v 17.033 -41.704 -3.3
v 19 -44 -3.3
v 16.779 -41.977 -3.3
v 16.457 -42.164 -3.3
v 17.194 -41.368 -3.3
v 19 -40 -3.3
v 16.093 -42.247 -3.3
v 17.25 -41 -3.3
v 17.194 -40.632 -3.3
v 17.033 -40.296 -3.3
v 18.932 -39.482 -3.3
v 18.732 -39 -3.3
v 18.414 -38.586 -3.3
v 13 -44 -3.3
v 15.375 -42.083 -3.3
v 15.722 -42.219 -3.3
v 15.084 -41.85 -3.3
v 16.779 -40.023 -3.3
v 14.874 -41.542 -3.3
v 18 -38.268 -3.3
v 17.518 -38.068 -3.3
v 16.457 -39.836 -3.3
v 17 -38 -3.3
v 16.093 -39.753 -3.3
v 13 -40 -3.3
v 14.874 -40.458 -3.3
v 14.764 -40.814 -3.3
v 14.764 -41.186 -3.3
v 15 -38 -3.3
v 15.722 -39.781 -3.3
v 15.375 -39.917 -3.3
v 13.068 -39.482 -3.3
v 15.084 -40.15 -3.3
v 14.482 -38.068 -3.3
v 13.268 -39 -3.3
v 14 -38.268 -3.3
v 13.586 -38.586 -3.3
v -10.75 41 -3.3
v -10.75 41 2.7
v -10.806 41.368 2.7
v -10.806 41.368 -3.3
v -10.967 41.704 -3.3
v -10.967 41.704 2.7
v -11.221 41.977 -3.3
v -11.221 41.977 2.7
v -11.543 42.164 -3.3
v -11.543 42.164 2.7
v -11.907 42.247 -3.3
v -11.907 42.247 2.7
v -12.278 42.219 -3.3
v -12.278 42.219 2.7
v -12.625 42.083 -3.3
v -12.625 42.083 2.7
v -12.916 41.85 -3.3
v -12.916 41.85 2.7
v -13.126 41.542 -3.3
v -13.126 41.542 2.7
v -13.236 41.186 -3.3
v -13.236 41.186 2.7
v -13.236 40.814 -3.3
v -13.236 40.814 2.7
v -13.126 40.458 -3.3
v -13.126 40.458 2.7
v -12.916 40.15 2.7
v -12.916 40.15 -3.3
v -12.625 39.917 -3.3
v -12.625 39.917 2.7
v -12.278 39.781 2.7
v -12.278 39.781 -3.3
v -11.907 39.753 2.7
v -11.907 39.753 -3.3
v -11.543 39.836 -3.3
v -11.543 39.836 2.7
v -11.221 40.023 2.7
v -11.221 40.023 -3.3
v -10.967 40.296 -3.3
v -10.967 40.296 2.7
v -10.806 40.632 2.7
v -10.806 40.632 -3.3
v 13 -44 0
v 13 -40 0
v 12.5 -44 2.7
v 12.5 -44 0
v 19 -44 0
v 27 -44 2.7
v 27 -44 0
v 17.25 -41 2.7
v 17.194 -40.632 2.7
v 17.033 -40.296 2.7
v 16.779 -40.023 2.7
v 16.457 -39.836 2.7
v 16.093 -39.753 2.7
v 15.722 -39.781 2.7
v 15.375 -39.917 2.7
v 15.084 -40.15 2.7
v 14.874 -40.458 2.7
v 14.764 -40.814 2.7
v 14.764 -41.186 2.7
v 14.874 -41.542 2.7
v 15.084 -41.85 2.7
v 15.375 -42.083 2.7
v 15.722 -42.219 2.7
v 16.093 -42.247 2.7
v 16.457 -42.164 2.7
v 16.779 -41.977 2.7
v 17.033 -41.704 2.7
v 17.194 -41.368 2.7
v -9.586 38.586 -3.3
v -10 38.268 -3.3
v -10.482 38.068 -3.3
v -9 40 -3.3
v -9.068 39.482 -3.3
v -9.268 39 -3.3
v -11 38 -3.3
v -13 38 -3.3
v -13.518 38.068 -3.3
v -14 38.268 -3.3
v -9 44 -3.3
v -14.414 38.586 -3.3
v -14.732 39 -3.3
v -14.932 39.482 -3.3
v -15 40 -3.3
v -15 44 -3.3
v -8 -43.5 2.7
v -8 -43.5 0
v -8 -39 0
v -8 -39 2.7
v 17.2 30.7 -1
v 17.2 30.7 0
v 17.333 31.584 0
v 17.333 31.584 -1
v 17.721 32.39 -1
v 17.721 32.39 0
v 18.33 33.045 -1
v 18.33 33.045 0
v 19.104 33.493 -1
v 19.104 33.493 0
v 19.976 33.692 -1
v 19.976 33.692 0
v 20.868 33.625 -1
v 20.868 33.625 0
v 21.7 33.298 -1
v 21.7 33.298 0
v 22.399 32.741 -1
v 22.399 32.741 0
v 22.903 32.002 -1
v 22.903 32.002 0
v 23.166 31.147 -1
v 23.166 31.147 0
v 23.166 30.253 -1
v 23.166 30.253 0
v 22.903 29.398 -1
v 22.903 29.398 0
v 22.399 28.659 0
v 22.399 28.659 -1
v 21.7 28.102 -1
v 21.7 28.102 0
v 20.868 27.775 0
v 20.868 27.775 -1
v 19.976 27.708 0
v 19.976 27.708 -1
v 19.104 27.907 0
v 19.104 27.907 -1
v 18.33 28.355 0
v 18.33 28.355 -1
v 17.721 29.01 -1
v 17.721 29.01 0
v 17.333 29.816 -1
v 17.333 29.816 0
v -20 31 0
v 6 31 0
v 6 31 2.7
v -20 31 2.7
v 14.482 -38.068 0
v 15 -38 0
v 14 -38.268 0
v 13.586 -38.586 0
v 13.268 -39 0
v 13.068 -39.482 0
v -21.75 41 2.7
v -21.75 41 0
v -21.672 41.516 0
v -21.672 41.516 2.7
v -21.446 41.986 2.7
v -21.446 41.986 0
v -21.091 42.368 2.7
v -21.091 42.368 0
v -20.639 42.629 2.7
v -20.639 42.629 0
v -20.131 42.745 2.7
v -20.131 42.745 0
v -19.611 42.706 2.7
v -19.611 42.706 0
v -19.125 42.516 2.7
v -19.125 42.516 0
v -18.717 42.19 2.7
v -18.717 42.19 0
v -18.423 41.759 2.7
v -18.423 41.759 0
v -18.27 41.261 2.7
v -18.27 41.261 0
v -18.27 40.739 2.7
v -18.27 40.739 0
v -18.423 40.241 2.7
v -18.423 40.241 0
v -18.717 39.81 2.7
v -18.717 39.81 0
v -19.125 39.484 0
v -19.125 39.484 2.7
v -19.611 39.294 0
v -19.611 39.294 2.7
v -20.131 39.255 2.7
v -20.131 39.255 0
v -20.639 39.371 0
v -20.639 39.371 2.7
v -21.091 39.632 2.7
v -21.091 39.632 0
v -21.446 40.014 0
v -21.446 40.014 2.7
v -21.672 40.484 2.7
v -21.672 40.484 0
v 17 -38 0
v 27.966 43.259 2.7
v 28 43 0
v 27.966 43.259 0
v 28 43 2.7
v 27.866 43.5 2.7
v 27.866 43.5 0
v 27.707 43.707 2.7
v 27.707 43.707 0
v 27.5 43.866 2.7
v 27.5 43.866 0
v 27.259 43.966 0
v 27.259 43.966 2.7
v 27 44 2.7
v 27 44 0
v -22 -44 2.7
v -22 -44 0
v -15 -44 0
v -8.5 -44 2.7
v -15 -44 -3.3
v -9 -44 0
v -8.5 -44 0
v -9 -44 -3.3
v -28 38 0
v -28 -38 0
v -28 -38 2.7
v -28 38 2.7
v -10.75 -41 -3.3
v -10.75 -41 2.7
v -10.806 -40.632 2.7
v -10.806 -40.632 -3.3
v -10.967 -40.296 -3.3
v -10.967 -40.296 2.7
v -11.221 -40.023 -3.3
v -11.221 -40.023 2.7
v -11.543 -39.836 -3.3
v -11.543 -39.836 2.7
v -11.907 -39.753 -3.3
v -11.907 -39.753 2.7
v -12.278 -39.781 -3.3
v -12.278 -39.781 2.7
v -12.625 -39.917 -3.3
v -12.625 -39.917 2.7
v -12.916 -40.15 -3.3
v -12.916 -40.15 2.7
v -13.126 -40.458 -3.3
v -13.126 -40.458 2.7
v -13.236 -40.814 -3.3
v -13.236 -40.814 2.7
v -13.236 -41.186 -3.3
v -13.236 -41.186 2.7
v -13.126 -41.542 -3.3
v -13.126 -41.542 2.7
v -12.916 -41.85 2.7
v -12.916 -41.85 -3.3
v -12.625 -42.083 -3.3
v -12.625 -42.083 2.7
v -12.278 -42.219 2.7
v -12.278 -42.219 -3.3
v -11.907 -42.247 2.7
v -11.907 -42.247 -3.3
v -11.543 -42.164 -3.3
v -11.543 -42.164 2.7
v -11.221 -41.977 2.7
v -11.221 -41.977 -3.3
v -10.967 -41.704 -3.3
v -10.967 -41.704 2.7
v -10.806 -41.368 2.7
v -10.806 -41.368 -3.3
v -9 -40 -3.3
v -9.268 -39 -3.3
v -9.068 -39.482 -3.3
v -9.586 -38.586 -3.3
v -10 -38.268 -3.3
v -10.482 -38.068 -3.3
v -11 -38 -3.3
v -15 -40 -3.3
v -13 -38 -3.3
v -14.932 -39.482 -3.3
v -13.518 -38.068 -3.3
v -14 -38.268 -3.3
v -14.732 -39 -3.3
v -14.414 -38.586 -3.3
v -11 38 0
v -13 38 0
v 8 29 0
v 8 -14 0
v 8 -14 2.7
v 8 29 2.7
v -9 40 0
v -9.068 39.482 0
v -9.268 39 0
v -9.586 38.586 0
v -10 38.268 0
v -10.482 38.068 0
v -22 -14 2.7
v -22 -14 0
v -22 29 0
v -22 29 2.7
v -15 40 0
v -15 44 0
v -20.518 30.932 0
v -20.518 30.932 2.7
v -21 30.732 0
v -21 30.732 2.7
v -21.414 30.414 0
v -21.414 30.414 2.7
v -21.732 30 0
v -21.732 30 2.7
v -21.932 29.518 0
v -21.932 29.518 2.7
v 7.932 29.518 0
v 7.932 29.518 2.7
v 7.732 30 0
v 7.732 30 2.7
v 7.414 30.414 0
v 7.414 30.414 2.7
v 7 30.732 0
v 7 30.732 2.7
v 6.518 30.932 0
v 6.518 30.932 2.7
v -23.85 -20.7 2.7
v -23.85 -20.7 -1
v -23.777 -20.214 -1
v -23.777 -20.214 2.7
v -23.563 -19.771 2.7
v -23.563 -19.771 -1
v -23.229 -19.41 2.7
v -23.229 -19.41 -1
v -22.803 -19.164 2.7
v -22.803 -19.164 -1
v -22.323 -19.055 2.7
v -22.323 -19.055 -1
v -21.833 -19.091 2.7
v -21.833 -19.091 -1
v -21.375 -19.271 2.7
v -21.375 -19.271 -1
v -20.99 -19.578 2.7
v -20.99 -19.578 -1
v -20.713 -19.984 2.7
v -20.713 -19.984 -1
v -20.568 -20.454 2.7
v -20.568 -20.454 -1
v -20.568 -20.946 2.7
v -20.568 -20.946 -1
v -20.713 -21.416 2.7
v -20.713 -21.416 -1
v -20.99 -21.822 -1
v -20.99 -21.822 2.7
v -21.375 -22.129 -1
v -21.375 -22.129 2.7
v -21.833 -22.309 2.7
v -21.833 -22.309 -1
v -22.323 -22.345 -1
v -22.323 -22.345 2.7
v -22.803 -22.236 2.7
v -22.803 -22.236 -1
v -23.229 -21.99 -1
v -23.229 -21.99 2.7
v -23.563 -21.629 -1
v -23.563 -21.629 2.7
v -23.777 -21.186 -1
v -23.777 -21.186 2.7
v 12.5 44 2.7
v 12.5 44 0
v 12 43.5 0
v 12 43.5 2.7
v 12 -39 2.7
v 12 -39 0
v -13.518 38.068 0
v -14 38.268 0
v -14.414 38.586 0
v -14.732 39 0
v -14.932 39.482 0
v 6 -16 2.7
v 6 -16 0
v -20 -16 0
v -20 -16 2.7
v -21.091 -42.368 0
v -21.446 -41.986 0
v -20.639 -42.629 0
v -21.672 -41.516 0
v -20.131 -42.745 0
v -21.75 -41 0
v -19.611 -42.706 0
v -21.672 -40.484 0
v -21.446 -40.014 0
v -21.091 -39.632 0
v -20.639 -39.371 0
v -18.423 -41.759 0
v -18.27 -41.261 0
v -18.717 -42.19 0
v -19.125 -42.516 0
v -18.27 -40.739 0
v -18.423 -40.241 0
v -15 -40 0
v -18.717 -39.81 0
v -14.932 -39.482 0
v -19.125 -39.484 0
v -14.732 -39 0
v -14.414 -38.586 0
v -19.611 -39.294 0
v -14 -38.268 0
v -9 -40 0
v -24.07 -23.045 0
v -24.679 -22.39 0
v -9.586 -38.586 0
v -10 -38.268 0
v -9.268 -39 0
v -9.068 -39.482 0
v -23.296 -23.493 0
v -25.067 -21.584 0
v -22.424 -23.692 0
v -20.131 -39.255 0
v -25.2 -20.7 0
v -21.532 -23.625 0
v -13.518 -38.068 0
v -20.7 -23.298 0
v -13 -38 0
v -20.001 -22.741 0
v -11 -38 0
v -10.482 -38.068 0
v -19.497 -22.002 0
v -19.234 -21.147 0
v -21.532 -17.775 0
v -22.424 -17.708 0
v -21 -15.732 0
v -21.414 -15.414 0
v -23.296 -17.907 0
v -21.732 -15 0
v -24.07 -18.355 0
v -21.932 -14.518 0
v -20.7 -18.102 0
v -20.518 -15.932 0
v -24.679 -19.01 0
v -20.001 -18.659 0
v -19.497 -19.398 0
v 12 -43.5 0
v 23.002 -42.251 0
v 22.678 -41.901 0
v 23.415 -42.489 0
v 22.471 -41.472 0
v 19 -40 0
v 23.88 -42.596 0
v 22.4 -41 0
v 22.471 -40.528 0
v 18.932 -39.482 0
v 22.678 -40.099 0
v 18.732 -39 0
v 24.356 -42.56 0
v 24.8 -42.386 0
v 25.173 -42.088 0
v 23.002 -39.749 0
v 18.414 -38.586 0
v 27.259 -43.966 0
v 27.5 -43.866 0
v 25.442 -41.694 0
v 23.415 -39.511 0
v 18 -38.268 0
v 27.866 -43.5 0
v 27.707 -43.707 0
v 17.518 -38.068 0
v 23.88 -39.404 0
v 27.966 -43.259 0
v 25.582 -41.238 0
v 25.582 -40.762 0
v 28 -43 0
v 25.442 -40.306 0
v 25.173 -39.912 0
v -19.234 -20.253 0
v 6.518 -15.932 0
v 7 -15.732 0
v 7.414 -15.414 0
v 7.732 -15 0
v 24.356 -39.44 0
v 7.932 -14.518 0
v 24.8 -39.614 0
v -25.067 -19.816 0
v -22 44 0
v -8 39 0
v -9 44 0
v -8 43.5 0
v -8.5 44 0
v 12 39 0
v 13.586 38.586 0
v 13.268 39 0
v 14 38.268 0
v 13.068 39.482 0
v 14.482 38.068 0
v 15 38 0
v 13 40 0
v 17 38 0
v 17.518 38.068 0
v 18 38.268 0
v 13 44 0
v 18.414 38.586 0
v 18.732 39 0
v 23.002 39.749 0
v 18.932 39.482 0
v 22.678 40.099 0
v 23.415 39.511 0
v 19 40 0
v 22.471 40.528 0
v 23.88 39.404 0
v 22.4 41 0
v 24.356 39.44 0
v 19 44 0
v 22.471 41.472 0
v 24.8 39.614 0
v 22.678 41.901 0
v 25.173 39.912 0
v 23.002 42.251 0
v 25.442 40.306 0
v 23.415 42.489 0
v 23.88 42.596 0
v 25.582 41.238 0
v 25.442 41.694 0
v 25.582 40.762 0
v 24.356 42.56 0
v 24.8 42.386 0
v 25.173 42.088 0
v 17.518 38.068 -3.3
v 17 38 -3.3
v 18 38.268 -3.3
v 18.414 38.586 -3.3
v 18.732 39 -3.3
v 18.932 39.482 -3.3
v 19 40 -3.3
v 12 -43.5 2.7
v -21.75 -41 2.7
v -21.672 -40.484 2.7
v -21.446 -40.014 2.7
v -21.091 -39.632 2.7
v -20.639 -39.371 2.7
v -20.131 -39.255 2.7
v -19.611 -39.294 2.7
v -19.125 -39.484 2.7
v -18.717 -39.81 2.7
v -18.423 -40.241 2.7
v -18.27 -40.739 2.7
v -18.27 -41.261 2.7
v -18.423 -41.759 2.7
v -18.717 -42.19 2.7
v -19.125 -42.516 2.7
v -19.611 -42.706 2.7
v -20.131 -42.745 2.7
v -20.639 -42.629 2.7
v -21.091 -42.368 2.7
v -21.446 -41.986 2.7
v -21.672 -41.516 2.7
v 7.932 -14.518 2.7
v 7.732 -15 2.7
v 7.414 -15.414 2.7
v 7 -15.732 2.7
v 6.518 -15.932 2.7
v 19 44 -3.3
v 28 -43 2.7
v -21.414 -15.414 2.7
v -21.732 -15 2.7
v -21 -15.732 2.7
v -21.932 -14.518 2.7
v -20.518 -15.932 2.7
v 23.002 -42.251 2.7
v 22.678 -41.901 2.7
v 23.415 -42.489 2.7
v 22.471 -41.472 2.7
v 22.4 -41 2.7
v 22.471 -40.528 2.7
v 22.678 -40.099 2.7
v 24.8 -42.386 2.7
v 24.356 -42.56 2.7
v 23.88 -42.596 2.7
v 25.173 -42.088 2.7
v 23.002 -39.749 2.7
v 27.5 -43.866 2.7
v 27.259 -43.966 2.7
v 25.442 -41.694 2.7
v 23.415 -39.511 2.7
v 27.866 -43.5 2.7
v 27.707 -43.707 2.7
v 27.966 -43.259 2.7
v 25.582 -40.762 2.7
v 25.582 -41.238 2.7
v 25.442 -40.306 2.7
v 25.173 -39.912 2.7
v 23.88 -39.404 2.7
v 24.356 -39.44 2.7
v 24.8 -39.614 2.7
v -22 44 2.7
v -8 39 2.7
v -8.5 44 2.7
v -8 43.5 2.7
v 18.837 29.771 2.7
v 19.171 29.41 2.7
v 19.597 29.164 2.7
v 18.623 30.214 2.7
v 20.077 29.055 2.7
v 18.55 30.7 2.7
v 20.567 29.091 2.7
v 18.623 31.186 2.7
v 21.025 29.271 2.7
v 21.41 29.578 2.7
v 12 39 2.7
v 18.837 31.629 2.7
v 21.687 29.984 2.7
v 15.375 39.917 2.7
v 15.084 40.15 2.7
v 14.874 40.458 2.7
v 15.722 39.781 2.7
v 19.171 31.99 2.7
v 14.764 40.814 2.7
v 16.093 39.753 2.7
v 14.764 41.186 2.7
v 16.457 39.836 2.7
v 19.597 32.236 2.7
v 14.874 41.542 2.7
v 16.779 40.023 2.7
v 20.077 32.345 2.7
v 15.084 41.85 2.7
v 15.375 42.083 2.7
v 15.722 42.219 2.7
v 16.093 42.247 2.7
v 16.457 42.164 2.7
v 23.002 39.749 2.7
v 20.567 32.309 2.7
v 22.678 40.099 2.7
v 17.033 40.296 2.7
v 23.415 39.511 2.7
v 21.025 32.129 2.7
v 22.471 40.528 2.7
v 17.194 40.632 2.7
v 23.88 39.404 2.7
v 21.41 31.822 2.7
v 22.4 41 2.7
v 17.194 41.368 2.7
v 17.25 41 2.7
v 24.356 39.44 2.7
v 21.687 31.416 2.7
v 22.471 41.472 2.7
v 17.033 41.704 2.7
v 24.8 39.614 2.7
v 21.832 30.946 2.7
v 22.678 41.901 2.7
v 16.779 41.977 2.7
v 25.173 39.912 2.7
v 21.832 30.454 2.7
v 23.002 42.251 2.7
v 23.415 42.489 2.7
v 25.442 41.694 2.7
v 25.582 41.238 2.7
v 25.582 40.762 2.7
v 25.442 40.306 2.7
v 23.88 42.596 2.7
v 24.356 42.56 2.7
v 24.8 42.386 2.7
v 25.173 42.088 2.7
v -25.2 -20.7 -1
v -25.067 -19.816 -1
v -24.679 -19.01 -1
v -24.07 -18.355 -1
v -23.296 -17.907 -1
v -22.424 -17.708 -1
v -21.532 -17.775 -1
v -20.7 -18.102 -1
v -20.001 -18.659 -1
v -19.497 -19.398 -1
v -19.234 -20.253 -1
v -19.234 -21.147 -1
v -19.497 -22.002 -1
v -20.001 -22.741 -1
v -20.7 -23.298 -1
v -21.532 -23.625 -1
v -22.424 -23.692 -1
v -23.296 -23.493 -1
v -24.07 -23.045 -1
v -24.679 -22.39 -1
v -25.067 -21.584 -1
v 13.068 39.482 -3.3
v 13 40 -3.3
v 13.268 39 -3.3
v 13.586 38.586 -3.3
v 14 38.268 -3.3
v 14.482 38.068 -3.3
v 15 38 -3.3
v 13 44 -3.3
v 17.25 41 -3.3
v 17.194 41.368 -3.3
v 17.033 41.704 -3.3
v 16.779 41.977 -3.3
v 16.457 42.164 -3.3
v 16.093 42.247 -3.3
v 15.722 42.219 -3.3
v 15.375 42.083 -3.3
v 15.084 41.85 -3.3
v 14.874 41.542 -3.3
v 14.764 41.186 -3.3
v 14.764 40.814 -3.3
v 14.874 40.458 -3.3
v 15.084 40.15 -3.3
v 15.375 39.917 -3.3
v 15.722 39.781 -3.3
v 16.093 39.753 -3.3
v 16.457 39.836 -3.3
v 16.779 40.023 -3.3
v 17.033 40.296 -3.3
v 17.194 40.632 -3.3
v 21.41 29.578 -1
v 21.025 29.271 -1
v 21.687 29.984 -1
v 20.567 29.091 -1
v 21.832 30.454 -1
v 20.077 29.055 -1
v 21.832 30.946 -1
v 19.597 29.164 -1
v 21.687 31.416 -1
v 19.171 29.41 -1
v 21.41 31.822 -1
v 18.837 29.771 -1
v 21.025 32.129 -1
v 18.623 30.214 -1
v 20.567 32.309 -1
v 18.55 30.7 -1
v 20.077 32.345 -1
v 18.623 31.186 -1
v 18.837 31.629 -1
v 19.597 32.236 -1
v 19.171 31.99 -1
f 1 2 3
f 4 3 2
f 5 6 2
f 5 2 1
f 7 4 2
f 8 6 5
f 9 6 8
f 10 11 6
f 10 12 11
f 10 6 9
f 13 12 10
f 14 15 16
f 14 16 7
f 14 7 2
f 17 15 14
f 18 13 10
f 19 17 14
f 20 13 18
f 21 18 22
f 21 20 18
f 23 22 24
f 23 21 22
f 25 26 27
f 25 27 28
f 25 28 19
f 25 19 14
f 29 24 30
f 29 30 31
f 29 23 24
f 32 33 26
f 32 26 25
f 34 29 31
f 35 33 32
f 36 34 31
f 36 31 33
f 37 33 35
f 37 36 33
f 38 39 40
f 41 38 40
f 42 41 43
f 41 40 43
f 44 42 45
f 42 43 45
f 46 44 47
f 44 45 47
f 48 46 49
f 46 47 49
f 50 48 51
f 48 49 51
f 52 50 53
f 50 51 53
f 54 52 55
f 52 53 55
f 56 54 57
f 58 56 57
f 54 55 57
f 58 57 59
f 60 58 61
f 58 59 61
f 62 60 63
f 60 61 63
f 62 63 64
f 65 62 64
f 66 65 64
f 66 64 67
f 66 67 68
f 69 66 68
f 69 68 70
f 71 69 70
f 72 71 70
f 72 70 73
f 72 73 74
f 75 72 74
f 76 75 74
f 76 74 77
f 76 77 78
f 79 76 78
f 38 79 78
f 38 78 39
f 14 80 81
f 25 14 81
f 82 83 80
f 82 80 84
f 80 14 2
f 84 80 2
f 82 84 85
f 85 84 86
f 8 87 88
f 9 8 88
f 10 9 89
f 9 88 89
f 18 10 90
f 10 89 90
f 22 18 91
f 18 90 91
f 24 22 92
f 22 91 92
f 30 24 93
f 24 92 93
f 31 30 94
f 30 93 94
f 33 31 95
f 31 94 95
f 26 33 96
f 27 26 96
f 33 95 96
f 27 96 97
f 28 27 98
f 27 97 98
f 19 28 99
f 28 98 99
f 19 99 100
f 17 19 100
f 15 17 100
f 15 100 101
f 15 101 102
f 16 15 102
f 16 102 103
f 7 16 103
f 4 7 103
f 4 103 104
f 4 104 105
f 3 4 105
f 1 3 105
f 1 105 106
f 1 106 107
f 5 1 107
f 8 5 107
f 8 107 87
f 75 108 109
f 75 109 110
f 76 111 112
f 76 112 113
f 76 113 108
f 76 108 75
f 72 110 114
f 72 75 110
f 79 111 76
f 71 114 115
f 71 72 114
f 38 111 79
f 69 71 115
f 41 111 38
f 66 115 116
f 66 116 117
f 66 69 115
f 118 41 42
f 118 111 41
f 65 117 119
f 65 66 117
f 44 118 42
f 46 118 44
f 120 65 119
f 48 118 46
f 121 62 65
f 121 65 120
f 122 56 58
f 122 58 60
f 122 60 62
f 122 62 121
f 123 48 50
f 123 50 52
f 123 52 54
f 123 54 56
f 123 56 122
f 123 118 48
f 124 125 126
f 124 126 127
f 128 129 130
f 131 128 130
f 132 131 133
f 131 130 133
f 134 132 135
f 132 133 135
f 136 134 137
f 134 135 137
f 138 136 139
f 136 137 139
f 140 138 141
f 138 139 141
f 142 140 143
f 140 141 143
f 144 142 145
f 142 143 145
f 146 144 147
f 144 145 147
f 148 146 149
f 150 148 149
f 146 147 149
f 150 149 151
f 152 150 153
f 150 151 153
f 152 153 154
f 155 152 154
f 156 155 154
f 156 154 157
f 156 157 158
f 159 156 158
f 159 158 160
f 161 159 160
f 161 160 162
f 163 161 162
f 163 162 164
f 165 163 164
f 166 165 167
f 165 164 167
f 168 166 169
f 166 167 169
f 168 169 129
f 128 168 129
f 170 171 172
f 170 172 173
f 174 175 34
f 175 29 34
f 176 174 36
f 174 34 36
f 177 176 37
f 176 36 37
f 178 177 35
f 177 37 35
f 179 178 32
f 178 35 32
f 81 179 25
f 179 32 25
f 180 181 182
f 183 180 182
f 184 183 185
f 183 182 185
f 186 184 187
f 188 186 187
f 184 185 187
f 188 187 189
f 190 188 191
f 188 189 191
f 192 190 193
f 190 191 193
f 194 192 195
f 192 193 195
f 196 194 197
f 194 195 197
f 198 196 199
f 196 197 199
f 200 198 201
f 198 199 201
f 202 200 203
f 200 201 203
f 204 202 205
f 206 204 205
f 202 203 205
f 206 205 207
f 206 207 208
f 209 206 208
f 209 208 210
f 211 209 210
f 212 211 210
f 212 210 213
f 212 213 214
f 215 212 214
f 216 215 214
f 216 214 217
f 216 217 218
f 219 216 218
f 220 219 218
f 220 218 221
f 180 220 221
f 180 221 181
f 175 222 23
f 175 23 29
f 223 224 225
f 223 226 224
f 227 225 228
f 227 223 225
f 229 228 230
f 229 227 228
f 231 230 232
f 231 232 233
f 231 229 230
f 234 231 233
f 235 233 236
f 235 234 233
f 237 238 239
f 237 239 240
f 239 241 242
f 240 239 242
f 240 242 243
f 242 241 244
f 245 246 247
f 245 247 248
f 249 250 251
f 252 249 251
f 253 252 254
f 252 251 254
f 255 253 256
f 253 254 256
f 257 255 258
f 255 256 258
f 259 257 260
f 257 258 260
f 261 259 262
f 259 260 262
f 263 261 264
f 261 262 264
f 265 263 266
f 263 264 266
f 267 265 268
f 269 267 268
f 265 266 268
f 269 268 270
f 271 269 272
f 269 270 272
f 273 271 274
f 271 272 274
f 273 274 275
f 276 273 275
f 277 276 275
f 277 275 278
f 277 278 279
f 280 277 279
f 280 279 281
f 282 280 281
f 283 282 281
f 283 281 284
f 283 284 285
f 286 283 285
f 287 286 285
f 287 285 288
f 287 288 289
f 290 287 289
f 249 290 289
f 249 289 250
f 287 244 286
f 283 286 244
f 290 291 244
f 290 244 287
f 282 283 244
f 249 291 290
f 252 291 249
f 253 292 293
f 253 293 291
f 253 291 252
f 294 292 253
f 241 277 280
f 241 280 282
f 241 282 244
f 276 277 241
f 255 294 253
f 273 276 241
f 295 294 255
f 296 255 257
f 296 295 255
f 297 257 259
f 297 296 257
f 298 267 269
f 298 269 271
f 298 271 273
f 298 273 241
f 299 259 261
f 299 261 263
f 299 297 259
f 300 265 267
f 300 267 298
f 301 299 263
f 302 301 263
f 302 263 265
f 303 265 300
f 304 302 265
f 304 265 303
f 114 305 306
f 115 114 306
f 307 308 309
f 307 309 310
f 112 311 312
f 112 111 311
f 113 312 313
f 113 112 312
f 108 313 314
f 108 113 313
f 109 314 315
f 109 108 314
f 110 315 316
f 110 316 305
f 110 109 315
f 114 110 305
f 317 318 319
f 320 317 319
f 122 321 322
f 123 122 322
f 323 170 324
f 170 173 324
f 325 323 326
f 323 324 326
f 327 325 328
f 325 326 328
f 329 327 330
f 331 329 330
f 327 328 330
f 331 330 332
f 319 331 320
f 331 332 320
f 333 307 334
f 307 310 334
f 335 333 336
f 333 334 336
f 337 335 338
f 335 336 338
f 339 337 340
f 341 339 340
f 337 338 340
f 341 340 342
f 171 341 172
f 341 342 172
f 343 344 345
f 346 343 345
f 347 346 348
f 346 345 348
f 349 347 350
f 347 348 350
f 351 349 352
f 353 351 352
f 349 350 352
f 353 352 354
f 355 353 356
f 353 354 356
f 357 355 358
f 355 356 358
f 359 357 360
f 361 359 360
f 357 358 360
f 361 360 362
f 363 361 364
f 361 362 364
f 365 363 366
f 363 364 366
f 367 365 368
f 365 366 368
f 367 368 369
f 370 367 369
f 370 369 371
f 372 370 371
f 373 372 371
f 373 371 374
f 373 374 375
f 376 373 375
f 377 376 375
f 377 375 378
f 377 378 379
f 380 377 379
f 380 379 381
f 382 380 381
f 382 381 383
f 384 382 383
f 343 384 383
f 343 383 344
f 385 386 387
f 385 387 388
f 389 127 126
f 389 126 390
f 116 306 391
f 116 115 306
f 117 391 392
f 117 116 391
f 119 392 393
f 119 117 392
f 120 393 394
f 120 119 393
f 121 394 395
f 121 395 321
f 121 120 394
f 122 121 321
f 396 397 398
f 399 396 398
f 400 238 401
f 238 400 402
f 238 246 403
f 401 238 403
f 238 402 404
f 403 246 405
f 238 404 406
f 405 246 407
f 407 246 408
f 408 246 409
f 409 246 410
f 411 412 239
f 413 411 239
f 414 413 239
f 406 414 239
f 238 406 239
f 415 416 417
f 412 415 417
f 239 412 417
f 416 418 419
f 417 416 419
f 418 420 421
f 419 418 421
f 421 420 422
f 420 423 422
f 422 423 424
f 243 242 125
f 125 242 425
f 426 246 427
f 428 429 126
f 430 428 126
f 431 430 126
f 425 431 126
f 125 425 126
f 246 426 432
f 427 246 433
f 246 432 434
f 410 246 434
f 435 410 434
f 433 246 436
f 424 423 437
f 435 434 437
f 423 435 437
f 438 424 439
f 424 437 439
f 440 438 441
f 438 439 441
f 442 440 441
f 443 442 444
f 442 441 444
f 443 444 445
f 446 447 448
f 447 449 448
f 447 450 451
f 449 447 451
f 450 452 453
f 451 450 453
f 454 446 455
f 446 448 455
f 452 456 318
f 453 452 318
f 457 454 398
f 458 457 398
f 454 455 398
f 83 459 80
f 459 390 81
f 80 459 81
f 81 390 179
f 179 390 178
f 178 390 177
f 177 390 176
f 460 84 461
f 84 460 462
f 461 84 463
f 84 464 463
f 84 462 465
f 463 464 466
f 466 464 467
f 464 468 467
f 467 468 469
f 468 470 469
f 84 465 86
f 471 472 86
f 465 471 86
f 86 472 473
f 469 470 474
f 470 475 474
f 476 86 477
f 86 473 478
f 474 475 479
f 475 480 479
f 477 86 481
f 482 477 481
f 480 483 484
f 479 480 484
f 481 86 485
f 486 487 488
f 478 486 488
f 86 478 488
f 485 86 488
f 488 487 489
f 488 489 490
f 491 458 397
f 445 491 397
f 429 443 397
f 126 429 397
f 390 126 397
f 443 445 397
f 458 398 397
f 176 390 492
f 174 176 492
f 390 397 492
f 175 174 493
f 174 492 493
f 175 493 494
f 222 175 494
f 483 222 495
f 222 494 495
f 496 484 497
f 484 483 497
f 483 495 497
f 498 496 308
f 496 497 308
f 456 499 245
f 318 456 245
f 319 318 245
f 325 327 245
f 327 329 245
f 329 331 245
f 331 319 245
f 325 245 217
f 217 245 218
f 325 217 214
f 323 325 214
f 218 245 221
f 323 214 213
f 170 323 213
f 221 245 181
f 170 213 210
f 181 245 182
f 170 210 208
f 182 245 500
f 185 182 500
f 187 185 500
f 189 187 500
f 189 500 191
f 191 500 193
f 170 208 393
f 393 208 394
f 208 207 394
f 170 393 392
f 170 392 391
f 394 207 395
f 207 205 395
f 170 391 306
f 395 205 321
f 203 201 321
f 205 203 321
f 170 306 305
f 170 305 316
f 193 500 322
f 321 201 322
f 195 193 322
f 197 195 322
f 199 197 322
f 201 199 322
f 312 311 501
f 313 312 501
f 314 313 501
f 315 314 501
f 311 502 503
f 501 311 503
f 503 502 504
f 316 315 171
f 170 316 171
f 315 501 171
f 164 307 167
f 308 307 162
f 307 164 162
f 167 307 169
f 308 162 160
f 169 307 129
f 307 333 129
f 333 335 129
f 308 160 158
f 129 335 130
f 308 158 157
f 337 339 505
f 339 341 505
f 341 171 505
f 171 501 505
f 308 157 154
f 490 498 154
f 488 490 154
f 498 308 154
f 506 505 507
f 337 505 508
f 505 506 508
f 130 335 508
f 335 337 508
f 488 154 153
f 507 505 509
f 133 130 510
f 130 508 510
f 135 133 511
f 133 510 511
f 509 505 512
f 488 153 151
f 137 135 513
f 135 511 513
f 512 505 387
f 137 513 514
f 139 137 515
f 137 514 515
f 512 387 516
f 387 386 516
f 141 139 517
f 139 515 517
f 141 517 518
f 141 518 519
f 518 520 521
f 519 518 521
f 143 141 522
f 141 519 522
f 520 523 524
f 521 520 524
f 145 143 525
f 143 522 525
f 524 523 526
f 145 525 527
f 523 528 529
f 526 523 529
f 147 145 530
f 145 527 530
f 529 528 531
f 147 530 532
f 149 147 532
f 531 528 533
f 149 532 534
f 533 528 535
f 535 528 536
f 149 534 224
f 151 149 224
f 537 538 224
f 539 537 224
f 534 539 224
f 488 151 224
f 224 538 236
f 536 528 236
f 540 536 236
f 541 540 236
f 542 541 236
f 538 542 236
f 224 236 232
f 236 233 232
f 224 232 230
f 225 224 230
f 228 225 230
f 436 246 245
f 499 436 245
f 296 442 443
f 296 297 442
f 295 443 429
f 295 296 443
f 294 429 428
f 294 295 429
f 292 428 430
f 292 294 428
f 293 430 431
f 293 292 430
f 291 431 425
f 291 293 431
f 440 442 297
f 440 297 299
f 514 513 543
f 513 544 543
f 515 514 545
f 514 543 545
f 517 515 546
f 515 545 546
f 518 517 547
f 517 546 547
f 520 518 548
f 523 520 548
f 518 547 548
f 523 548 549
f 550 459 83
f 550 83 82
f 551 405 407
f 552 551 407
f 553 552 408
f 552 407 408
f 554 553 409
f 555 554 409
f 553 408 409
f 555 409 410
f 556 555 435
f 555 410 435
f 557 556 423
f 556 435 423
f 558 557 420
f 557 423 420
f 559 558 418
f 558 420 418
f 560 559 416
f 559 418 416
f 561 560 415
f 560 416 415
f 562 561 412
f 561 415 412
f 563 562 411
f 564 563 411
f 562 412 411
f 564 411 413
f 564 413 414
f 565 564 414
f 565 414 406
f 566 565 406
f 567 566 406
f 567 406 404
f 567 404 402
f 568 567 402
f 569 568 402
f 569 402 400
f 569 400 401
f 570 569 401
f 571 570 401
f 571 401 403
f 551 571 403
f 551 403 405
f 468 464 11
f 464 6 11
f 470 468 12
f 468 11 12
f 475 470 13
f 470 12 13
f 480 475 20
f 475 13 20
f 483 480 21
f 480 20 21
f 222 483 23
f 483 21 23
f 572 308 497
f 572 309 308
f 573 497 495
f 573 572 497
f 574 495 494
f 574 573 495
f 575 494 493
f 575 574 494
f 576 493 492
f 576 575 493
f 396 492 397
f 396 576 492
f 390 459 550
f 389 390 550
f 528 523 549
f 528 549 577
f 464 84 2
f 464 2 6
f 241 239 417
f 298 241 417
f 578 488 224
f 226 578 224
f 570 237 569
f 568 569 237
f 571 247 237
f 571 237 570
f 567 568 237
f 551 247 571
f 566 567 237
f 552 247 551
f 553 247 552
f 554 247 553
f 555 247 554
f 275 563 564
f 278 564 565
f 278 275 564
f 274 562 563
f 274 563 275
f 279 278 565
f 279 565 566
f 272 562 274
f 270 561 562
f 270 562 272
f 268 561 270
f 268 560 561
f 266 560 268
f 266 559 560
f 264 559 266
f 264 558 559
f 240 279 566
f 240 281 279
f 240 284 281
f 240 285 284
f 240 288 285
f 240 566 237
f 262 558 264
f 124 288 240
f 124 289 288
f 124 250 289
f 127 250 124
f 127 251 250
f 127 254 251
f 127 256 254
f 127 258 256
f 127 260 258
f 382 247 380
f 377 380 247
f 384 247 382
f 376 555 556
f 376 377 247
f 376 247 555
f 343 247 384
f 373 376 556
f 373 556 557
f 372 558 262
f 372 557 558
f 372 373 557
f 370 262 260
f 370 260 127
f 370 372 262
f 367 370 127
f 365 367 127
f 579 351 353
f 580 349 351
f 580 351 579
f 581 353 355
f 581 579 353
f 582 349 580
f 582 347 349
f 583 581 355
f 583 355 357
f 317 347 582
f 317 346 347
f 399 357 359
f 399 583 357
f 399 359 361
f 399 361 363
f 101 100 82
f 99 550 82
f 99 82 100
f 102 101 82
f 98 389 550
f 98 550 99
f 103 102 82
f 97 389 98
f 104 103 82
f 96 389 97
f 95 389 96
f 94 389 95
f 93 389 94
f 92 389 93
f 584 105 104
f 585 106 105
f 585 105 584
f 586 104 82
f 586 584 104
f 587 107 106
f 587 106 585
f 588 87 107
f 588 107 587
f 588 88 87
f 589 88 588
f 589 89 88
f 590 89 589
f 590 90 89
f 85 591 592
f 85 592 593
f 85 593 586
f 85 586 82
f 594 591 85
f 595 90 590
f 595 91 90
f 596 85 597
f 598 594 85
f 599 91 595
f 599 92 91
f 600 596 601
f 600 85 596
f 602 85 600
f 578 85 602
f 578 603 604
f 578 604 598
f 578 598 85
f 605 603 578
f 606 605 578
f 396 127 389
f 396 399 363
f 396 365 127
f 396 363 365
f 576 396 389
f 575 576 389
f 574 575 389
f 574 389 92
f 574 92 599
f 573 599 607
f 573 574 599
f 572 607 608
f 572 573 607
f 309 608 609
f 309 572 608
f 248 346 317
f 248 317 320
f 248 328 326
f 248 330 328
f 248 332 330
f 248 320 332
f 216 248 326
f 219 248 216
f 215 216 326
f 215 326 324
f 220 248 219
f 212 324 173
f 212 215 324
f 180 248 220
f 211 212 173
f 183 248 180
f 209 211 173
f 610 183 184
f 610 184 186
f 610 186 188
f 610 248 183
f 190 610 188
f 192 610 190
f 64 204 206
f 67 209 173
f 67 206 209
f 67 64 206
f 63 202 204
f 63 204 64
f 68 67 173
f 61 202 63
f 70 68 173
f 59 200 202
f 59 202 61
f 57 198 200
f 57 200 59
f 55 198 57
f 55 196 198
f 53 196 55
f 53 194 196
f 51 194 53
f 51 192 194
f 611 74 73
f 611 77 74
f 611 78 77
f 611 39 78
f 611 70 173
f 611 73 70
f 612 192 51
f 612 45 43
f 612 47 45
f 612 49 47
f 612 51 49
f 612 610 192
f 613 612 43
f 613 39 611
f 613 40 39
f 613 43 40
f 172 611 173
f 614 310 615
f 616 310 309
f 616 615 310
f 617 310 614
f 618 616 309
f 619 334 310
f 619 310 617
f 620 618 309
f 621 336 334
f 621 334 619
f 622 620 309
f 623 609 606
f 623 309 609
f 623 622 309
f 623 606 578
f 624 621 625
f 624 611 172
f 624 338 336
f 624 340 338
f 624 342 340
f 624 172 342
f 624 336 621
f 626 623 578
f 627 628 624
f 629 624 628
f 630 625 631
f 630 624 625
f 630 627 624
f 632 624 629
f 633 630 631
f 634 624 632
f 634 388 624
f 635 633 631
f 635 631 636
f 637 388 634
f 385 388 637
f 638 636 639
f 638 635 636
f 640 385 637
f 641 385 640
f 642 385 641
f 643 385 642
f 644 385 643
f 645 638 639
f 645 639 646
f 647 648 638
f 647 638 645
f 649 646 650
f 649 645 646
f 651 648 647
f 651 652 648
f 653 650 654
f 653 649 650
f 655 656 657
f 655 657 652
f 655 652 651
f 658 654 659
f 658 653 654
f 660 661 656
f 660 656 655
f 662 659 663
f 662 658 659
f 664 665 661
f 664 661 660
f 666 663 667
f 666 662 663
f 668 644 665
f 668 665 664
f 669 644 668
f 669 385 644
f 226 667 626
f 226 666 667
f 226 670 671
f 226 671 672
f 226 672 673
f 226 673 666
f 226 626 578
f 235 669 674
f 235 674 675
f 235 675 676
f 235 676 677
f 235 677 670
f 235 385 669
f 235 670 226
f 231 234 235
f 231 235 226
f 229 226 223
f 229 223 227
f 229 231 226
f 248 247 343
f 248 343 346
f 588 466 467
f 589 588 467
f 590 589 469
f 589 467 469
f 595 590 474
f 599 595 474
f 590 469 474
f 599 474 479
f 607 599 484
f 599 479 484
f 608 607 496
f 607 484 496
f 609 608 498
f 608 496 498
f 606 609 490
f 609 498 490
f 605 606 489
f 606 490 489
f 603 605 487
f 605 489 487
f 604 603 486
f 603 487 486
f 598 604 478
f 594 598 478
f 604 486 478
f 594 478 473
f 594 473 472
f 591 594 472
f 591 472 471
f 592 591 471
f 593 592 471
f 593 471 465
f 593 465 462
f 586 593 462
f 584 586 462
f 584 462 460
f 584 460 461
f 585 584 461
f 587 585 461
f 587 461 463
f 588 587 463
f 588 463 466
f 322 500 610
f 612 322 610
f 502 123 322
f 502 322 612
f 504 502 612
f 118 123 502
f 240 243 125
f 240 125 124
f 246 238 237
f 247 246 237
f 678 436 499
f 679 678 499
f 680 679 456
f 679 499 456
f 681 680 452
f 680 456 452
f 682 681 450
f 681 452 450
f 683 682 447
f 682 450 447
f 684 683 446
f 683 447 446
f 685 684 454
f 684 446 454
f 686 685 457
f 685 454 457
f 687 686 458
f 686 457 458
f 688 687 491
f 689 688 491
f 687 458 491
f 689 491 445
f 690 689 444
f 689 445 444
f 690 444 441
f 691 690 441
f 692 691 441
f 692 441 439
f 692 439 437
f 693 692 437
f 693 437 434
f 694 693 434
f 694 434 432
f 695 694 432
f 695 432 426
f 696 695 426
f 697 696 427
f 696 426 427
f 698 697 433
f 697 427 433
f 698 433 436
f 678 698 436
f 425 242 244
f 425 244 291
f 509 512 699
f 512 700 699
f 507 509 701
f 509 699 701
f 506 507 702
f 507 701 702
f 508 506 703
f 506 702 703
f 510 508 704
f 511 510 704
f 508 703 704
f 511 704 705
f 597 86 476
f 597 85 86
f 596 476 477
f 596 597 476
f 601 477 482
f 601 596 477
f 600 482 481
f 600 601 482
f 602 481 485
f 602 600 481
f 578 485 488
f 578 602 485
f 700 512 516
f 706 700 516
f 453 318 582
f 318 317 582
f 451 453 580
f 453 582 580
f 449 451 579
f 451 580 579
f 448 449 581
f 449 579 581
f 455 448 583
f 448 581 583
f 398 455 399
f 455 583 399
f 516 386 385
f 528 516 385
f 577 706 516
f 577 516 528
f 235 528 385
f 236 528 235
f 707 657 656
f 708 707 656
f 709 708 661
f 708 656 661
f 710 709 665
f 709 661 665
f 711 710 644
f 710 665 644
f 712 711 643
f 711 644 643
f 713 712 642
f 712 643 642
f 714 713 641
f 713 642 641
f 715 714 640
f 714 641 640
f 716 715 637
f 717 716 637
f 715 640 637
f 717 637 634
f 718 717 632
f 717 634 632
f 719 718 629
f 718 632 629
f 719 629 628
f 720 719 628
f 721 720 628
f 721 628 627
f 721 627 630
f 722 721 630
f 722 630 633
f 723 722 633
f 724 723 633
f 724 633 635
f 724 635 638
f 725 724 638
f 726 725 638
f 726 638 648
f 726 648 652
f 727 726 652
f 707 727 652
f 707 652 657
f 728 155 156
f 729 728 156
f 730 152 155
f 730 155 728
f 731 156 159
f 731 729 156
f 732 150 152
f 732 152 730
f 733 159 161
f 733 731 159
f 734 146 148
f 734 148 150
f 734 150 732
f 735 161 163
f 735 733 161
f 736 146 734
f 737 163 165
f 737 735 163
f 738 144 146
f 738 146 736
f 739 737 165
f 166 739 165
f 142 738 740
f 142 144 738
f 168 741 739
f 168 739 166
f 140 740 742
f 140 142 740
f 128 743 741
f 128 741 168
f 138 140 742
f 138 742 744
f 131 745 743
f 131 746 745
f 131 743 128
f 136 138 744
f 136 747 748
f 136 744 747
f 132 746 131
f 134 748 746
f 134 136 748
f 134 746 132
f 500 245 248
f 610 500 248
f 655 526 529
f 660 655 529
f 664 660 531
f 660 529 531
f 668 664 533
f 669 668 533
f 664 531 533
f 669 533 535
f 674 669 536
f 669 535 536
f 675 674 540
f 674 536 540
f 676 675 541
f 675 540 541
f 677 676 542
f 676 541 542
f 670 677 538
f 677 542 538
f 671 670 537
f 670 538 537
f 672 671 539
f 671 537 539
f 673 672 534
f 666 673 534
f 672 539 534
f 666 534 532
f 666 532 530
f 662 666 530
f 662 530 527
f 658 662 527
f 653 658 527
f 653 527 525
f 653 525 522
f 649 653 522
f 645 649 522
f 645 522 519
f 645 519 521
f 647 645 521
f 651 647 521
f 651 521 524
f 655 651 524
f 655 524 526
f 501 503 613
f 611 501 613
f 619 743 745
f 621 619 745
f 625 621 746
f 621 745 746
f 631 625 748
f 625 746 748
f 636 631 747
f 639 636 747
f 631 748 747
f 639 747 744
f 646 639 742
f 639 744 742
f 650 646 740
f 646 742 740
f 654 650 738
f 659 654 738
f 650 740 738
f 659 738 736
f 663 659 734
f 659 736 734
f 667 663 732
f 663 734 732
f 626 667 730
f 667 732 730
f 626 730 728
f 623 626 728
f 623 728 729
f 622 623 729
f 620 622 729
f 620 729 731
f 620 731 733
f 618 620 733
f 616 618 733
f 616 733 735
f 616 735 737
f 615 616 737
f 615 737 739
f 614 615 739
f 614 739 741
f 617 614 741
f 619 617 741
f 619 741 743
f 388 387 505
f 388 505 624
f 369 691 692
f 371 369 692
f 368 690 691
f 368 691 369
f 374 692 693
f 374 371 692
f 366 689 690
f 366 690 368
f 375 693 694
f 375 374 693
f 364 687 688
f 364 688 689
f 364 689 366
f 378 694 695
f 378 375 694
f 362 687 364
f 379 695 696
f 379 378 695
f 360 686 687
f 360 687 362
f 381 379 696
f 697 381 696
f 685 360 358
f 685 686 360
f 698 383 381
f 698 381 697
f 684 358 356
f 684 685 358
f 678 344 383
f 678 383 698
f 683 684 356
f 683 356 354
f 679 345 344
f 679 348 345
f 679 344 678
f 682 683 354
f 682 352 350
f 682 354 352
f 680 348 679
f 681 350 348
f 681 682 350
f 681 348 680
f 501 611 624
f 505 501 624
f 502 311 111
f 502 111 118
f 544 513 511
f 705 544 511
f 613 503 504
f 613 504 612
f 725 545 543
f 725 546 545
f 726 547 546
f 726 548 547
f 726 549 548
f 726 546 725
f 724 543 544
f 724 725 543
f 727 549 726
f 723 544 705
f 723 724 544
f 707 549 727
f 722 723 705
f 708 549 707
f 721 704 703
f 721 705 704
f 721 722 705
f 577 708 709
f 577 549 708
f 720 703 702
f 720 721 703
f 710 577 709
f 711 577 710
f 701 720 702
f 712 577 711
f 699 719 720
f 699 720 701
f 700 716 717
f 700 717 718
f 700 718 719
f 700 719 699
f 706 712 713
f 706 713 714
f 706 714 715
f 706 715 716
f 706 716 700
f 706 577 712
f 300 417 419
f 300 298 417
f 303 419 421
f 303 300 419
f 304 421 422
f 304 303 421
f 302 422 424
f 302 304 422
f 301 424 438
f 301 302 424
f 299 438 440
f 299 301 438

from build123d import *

# Parameters (mm, degrees)
SKETCH_1_W             = 56
SKETCH_1_H             = 88
EXTRUDE_1_DEPTH        = 2.7
FILLET_1_R             = 1
SKETCH_8_R             = 1.6
SKETCH_8_R_2           = 1.75
CUT_EXTRUDE_1_DEPTH    = 10
CHAMFER_1_SIZE         = 6
SKETCH_16_R            = 3
EXTRUDE_3_DEPTH        = 1
HOLE_WIZARD_M4_1_D     = 3.3
HOLE_WIZARD_M4_1_DEPTH = 10.1
HOLE_WIZARD_M4_1_TIP   = 0.991420021
SKETCH_11_W            = 6
SKETCH_11_H            = 6
EXTRUDE_2_DEPTH        = 3.3
HOLE_WIZARD_M3_1_D     = 2.5
HOLE_WIZARD_M3_1_DEPTH = 7.5
HOLE_WIZARD_M3_1_TIP   = 0.751075774
SKETCH_14_W            = 30
SKETCH_14_H            = 47
CUT_EXTRUDE_2_DEPTH    = 10
FILLET_2_R             = 2
SKETCH_15_W            = 20
SKETCH_15_H            = 2.7
CUT_EXTRUDE_3_DEPTH    = 5
CHAMFER_2_SIZE         = 0.5
FILLET_3_R             = 2


with BuildPart() as part:
    # 草图1 → 凸台-拉伸1 (new body)
    with BuildSketch(Plane.XY):
        Rectangle(SKETCH_1_W, SKETCH_1_H)
    extrude(amount=EXTRUDE_1_DEPTH)

    # 圆角1
    fillet_1_edges = [part.edges().sort_by_distance(p)[0] for p in [
        (28, -44, 1.35),
        (28, 44, 1.35),
    ]]
    fillet(fillet_1_edges, radius=FILLET_1_R)

    # 草图8 → 切除-拉伸1 (cut)
    with BuildSketch(Plane(origin=(0, 0, 0), x_dir=(-1, 0, 0), z_dir=(0, 0, -1))):
        with Locations((-24, 41)):
            Circle(SKETCH_8_R)
        with Locations((20, 41)):
            Circle(SKETCH_8_R_2)
        with Locations((-24, -41)):
            Circle(SKETCH_8_R)
        with Locations((20, -41)):
            Circle(SKETCH_8_R_2)
    extrude(amount=-CUT_EXTRUDE_1_DEPTH, mode=Mode.SUBTRACT)

    # 倒角1
    chamfer_1_edges = [part.edges().sort_by_distance(p)[0] for p in [
        (-28, -44, 1.35),
        (-28, 44, 1.35),
    ]]
    chamfer(chamfer_1_edges, length=CHAMFER_1_SIZE)

    # 草图16 → 凸台-拉伸3 (add)
    with BuildSketch(Plane(origin=(0, 0, 0), x_dir=(-1, 0, 0), z_dir=(0, 0, -1))):
        with Locations((22.2, -20.7)):
            Circle(SKETCH_16_R)
        with Locations((-20.2, 30.7)):
            Circle(SKETCH_16_R)
    extrude(amount=EXTRUDE_3_DEPTH)

    # M4 螺纹孔1
    with Locations(Plane.XY.offset(2.7)):
        with Locations((20.2, 30.7), (-22.2, -20.7)):
            Hole(HOLE_WIZARD_M4_1_D / 2, depth=HOLE_WIZARD_M4_1_DEPTH)
            with Locations((0, 0, -(HOLE_WIZARD_M4_1_DEPTH + HOLE_WIZARD_M4_1_TIP / 2))):  # 118° drill point
                Cone(0, HOLE_WIZARD_M4_1_D / 2, HOLE_WIZARD_M4_1_TIP, mode=Mode.SUBTRACT)

    # 草图11 → 凸台-拉伸2 (add)
    with BuildSketch(Plane(origin=(0, 0, 0), x_dir=(-1, 0, 0), z_dir=(0, 0, -1))):
        with Locations((-16, 41)):
            Rectangle(SKETCH_11_W, SKETCH_11_H)
        with Locations((12, 41)):
            Rectangle(SKETCH_11_W, SKETCH_11_H)
        with Locations((-16, -41)):
            Rectangle(SKETCH_11_W, SKETCH_11_H)
        with Locations((12, -41)):
            Rectangle(SKETCH_11_W, SKETCH_11_H)
    extrude(amount=EXTRUDE_2_DEPTH)

    # M3 螺纹孔1
    with Locations(Plane(origin=(0, 0, -3.3), x_dir=(-1, 0, 0), z_dir=(0, 0, -1))):
        with Locations((-16, 41), (12, 41), (-16, -41), (12, -41)):
            Hole(HOLE_WIZARD_M3_1_D / 2, depth=HOLE_WIZARD_M3_1_DEPTH)
            with Locations((0, 0, -(HOLE_WIZARD_M3_1_DEPTH + HOLE_WIZARD_M3_1_TIP / 2))):  # 118° drill point
                Cone(0, HOLE_WIZARD_M3_1_D / 2, HOLE_WIZARD_M3_1_TIP, mode=Mode.SUBTRACT)

    # 草图14 → 切除-拉伸2 (cut)
    with BuildSketch(Plane(origin=(0, 0, 0), x_dir=(-1, 0, 0), z_dir=(0, 0, -1))):
        with Locations((7, 7.5)):
            Rectangle(SKETCH_14_W, SKETCH_14_H)
    extrude(amount=-CUT_EXTRUDE_2_DEPTH, mode=Mode.SUBTRACT)

    # 圆角2
    fillet_2_edges = [part.edges().sort_by_distance(p)[0] for p in [
        (8, -16, 1.35),
        (8, 31, 1.35),
        (-22, 31, 1.35),
        (-22, -16, 1.35),
    ]]
    fillet(fillet_2_edges, radius=FILLET_2_R)

    # 草图15 → 切除-拉伸3 (cut)
    with BuildSketch(Plane.XZ.offset(44)):
        with Locations((2, 1.35)):
            Rectangle(SKETCH_15_W, SKETCH_15_H)
    cut_extrude_3 = extrude(amount=-CUT_EXTRUDE_3_DEPTH, mode=Mode.SUBTRACT)

    # 镜向2: 切除-拉伸3 across plane
    add(cut_extrude_3.mirror(Plane(origin=(0, 0, 0), x_dir=(0, 0, 1), z_dir=(0, -1, 0))), mode=Mode.SUBTRACT)

    # 倒角2
    chamfer_2_edges = [part.edges().sort_by_distance(p)[0] for p in [
        (12, -44, 1.35),
        (-8, -44, 1.35),
        (12, 44, 1.35),
        (-8, 44, 1.35),
    ]]
    chamfer(chamfer_2_edges, length=CHAMFER_2_SIZE)

    # 圆角3
    fillet_3_edges = [part.edges().sort_by_distance(p)[0] for p in [
        (19, -38, -1.65),
        (13, -38, -1.65),
        (-9, -38, -1.65),
        (-15, -38, -1.65),
        (19, 38, -1.65),
        (13, 38, -1.65),
        (-9, 38, -1.65),
        (-15, 38, -1.65),
    ]]
    fillet(fillet_3_edges, radius=FILLET_3_R)


solid = part.part
